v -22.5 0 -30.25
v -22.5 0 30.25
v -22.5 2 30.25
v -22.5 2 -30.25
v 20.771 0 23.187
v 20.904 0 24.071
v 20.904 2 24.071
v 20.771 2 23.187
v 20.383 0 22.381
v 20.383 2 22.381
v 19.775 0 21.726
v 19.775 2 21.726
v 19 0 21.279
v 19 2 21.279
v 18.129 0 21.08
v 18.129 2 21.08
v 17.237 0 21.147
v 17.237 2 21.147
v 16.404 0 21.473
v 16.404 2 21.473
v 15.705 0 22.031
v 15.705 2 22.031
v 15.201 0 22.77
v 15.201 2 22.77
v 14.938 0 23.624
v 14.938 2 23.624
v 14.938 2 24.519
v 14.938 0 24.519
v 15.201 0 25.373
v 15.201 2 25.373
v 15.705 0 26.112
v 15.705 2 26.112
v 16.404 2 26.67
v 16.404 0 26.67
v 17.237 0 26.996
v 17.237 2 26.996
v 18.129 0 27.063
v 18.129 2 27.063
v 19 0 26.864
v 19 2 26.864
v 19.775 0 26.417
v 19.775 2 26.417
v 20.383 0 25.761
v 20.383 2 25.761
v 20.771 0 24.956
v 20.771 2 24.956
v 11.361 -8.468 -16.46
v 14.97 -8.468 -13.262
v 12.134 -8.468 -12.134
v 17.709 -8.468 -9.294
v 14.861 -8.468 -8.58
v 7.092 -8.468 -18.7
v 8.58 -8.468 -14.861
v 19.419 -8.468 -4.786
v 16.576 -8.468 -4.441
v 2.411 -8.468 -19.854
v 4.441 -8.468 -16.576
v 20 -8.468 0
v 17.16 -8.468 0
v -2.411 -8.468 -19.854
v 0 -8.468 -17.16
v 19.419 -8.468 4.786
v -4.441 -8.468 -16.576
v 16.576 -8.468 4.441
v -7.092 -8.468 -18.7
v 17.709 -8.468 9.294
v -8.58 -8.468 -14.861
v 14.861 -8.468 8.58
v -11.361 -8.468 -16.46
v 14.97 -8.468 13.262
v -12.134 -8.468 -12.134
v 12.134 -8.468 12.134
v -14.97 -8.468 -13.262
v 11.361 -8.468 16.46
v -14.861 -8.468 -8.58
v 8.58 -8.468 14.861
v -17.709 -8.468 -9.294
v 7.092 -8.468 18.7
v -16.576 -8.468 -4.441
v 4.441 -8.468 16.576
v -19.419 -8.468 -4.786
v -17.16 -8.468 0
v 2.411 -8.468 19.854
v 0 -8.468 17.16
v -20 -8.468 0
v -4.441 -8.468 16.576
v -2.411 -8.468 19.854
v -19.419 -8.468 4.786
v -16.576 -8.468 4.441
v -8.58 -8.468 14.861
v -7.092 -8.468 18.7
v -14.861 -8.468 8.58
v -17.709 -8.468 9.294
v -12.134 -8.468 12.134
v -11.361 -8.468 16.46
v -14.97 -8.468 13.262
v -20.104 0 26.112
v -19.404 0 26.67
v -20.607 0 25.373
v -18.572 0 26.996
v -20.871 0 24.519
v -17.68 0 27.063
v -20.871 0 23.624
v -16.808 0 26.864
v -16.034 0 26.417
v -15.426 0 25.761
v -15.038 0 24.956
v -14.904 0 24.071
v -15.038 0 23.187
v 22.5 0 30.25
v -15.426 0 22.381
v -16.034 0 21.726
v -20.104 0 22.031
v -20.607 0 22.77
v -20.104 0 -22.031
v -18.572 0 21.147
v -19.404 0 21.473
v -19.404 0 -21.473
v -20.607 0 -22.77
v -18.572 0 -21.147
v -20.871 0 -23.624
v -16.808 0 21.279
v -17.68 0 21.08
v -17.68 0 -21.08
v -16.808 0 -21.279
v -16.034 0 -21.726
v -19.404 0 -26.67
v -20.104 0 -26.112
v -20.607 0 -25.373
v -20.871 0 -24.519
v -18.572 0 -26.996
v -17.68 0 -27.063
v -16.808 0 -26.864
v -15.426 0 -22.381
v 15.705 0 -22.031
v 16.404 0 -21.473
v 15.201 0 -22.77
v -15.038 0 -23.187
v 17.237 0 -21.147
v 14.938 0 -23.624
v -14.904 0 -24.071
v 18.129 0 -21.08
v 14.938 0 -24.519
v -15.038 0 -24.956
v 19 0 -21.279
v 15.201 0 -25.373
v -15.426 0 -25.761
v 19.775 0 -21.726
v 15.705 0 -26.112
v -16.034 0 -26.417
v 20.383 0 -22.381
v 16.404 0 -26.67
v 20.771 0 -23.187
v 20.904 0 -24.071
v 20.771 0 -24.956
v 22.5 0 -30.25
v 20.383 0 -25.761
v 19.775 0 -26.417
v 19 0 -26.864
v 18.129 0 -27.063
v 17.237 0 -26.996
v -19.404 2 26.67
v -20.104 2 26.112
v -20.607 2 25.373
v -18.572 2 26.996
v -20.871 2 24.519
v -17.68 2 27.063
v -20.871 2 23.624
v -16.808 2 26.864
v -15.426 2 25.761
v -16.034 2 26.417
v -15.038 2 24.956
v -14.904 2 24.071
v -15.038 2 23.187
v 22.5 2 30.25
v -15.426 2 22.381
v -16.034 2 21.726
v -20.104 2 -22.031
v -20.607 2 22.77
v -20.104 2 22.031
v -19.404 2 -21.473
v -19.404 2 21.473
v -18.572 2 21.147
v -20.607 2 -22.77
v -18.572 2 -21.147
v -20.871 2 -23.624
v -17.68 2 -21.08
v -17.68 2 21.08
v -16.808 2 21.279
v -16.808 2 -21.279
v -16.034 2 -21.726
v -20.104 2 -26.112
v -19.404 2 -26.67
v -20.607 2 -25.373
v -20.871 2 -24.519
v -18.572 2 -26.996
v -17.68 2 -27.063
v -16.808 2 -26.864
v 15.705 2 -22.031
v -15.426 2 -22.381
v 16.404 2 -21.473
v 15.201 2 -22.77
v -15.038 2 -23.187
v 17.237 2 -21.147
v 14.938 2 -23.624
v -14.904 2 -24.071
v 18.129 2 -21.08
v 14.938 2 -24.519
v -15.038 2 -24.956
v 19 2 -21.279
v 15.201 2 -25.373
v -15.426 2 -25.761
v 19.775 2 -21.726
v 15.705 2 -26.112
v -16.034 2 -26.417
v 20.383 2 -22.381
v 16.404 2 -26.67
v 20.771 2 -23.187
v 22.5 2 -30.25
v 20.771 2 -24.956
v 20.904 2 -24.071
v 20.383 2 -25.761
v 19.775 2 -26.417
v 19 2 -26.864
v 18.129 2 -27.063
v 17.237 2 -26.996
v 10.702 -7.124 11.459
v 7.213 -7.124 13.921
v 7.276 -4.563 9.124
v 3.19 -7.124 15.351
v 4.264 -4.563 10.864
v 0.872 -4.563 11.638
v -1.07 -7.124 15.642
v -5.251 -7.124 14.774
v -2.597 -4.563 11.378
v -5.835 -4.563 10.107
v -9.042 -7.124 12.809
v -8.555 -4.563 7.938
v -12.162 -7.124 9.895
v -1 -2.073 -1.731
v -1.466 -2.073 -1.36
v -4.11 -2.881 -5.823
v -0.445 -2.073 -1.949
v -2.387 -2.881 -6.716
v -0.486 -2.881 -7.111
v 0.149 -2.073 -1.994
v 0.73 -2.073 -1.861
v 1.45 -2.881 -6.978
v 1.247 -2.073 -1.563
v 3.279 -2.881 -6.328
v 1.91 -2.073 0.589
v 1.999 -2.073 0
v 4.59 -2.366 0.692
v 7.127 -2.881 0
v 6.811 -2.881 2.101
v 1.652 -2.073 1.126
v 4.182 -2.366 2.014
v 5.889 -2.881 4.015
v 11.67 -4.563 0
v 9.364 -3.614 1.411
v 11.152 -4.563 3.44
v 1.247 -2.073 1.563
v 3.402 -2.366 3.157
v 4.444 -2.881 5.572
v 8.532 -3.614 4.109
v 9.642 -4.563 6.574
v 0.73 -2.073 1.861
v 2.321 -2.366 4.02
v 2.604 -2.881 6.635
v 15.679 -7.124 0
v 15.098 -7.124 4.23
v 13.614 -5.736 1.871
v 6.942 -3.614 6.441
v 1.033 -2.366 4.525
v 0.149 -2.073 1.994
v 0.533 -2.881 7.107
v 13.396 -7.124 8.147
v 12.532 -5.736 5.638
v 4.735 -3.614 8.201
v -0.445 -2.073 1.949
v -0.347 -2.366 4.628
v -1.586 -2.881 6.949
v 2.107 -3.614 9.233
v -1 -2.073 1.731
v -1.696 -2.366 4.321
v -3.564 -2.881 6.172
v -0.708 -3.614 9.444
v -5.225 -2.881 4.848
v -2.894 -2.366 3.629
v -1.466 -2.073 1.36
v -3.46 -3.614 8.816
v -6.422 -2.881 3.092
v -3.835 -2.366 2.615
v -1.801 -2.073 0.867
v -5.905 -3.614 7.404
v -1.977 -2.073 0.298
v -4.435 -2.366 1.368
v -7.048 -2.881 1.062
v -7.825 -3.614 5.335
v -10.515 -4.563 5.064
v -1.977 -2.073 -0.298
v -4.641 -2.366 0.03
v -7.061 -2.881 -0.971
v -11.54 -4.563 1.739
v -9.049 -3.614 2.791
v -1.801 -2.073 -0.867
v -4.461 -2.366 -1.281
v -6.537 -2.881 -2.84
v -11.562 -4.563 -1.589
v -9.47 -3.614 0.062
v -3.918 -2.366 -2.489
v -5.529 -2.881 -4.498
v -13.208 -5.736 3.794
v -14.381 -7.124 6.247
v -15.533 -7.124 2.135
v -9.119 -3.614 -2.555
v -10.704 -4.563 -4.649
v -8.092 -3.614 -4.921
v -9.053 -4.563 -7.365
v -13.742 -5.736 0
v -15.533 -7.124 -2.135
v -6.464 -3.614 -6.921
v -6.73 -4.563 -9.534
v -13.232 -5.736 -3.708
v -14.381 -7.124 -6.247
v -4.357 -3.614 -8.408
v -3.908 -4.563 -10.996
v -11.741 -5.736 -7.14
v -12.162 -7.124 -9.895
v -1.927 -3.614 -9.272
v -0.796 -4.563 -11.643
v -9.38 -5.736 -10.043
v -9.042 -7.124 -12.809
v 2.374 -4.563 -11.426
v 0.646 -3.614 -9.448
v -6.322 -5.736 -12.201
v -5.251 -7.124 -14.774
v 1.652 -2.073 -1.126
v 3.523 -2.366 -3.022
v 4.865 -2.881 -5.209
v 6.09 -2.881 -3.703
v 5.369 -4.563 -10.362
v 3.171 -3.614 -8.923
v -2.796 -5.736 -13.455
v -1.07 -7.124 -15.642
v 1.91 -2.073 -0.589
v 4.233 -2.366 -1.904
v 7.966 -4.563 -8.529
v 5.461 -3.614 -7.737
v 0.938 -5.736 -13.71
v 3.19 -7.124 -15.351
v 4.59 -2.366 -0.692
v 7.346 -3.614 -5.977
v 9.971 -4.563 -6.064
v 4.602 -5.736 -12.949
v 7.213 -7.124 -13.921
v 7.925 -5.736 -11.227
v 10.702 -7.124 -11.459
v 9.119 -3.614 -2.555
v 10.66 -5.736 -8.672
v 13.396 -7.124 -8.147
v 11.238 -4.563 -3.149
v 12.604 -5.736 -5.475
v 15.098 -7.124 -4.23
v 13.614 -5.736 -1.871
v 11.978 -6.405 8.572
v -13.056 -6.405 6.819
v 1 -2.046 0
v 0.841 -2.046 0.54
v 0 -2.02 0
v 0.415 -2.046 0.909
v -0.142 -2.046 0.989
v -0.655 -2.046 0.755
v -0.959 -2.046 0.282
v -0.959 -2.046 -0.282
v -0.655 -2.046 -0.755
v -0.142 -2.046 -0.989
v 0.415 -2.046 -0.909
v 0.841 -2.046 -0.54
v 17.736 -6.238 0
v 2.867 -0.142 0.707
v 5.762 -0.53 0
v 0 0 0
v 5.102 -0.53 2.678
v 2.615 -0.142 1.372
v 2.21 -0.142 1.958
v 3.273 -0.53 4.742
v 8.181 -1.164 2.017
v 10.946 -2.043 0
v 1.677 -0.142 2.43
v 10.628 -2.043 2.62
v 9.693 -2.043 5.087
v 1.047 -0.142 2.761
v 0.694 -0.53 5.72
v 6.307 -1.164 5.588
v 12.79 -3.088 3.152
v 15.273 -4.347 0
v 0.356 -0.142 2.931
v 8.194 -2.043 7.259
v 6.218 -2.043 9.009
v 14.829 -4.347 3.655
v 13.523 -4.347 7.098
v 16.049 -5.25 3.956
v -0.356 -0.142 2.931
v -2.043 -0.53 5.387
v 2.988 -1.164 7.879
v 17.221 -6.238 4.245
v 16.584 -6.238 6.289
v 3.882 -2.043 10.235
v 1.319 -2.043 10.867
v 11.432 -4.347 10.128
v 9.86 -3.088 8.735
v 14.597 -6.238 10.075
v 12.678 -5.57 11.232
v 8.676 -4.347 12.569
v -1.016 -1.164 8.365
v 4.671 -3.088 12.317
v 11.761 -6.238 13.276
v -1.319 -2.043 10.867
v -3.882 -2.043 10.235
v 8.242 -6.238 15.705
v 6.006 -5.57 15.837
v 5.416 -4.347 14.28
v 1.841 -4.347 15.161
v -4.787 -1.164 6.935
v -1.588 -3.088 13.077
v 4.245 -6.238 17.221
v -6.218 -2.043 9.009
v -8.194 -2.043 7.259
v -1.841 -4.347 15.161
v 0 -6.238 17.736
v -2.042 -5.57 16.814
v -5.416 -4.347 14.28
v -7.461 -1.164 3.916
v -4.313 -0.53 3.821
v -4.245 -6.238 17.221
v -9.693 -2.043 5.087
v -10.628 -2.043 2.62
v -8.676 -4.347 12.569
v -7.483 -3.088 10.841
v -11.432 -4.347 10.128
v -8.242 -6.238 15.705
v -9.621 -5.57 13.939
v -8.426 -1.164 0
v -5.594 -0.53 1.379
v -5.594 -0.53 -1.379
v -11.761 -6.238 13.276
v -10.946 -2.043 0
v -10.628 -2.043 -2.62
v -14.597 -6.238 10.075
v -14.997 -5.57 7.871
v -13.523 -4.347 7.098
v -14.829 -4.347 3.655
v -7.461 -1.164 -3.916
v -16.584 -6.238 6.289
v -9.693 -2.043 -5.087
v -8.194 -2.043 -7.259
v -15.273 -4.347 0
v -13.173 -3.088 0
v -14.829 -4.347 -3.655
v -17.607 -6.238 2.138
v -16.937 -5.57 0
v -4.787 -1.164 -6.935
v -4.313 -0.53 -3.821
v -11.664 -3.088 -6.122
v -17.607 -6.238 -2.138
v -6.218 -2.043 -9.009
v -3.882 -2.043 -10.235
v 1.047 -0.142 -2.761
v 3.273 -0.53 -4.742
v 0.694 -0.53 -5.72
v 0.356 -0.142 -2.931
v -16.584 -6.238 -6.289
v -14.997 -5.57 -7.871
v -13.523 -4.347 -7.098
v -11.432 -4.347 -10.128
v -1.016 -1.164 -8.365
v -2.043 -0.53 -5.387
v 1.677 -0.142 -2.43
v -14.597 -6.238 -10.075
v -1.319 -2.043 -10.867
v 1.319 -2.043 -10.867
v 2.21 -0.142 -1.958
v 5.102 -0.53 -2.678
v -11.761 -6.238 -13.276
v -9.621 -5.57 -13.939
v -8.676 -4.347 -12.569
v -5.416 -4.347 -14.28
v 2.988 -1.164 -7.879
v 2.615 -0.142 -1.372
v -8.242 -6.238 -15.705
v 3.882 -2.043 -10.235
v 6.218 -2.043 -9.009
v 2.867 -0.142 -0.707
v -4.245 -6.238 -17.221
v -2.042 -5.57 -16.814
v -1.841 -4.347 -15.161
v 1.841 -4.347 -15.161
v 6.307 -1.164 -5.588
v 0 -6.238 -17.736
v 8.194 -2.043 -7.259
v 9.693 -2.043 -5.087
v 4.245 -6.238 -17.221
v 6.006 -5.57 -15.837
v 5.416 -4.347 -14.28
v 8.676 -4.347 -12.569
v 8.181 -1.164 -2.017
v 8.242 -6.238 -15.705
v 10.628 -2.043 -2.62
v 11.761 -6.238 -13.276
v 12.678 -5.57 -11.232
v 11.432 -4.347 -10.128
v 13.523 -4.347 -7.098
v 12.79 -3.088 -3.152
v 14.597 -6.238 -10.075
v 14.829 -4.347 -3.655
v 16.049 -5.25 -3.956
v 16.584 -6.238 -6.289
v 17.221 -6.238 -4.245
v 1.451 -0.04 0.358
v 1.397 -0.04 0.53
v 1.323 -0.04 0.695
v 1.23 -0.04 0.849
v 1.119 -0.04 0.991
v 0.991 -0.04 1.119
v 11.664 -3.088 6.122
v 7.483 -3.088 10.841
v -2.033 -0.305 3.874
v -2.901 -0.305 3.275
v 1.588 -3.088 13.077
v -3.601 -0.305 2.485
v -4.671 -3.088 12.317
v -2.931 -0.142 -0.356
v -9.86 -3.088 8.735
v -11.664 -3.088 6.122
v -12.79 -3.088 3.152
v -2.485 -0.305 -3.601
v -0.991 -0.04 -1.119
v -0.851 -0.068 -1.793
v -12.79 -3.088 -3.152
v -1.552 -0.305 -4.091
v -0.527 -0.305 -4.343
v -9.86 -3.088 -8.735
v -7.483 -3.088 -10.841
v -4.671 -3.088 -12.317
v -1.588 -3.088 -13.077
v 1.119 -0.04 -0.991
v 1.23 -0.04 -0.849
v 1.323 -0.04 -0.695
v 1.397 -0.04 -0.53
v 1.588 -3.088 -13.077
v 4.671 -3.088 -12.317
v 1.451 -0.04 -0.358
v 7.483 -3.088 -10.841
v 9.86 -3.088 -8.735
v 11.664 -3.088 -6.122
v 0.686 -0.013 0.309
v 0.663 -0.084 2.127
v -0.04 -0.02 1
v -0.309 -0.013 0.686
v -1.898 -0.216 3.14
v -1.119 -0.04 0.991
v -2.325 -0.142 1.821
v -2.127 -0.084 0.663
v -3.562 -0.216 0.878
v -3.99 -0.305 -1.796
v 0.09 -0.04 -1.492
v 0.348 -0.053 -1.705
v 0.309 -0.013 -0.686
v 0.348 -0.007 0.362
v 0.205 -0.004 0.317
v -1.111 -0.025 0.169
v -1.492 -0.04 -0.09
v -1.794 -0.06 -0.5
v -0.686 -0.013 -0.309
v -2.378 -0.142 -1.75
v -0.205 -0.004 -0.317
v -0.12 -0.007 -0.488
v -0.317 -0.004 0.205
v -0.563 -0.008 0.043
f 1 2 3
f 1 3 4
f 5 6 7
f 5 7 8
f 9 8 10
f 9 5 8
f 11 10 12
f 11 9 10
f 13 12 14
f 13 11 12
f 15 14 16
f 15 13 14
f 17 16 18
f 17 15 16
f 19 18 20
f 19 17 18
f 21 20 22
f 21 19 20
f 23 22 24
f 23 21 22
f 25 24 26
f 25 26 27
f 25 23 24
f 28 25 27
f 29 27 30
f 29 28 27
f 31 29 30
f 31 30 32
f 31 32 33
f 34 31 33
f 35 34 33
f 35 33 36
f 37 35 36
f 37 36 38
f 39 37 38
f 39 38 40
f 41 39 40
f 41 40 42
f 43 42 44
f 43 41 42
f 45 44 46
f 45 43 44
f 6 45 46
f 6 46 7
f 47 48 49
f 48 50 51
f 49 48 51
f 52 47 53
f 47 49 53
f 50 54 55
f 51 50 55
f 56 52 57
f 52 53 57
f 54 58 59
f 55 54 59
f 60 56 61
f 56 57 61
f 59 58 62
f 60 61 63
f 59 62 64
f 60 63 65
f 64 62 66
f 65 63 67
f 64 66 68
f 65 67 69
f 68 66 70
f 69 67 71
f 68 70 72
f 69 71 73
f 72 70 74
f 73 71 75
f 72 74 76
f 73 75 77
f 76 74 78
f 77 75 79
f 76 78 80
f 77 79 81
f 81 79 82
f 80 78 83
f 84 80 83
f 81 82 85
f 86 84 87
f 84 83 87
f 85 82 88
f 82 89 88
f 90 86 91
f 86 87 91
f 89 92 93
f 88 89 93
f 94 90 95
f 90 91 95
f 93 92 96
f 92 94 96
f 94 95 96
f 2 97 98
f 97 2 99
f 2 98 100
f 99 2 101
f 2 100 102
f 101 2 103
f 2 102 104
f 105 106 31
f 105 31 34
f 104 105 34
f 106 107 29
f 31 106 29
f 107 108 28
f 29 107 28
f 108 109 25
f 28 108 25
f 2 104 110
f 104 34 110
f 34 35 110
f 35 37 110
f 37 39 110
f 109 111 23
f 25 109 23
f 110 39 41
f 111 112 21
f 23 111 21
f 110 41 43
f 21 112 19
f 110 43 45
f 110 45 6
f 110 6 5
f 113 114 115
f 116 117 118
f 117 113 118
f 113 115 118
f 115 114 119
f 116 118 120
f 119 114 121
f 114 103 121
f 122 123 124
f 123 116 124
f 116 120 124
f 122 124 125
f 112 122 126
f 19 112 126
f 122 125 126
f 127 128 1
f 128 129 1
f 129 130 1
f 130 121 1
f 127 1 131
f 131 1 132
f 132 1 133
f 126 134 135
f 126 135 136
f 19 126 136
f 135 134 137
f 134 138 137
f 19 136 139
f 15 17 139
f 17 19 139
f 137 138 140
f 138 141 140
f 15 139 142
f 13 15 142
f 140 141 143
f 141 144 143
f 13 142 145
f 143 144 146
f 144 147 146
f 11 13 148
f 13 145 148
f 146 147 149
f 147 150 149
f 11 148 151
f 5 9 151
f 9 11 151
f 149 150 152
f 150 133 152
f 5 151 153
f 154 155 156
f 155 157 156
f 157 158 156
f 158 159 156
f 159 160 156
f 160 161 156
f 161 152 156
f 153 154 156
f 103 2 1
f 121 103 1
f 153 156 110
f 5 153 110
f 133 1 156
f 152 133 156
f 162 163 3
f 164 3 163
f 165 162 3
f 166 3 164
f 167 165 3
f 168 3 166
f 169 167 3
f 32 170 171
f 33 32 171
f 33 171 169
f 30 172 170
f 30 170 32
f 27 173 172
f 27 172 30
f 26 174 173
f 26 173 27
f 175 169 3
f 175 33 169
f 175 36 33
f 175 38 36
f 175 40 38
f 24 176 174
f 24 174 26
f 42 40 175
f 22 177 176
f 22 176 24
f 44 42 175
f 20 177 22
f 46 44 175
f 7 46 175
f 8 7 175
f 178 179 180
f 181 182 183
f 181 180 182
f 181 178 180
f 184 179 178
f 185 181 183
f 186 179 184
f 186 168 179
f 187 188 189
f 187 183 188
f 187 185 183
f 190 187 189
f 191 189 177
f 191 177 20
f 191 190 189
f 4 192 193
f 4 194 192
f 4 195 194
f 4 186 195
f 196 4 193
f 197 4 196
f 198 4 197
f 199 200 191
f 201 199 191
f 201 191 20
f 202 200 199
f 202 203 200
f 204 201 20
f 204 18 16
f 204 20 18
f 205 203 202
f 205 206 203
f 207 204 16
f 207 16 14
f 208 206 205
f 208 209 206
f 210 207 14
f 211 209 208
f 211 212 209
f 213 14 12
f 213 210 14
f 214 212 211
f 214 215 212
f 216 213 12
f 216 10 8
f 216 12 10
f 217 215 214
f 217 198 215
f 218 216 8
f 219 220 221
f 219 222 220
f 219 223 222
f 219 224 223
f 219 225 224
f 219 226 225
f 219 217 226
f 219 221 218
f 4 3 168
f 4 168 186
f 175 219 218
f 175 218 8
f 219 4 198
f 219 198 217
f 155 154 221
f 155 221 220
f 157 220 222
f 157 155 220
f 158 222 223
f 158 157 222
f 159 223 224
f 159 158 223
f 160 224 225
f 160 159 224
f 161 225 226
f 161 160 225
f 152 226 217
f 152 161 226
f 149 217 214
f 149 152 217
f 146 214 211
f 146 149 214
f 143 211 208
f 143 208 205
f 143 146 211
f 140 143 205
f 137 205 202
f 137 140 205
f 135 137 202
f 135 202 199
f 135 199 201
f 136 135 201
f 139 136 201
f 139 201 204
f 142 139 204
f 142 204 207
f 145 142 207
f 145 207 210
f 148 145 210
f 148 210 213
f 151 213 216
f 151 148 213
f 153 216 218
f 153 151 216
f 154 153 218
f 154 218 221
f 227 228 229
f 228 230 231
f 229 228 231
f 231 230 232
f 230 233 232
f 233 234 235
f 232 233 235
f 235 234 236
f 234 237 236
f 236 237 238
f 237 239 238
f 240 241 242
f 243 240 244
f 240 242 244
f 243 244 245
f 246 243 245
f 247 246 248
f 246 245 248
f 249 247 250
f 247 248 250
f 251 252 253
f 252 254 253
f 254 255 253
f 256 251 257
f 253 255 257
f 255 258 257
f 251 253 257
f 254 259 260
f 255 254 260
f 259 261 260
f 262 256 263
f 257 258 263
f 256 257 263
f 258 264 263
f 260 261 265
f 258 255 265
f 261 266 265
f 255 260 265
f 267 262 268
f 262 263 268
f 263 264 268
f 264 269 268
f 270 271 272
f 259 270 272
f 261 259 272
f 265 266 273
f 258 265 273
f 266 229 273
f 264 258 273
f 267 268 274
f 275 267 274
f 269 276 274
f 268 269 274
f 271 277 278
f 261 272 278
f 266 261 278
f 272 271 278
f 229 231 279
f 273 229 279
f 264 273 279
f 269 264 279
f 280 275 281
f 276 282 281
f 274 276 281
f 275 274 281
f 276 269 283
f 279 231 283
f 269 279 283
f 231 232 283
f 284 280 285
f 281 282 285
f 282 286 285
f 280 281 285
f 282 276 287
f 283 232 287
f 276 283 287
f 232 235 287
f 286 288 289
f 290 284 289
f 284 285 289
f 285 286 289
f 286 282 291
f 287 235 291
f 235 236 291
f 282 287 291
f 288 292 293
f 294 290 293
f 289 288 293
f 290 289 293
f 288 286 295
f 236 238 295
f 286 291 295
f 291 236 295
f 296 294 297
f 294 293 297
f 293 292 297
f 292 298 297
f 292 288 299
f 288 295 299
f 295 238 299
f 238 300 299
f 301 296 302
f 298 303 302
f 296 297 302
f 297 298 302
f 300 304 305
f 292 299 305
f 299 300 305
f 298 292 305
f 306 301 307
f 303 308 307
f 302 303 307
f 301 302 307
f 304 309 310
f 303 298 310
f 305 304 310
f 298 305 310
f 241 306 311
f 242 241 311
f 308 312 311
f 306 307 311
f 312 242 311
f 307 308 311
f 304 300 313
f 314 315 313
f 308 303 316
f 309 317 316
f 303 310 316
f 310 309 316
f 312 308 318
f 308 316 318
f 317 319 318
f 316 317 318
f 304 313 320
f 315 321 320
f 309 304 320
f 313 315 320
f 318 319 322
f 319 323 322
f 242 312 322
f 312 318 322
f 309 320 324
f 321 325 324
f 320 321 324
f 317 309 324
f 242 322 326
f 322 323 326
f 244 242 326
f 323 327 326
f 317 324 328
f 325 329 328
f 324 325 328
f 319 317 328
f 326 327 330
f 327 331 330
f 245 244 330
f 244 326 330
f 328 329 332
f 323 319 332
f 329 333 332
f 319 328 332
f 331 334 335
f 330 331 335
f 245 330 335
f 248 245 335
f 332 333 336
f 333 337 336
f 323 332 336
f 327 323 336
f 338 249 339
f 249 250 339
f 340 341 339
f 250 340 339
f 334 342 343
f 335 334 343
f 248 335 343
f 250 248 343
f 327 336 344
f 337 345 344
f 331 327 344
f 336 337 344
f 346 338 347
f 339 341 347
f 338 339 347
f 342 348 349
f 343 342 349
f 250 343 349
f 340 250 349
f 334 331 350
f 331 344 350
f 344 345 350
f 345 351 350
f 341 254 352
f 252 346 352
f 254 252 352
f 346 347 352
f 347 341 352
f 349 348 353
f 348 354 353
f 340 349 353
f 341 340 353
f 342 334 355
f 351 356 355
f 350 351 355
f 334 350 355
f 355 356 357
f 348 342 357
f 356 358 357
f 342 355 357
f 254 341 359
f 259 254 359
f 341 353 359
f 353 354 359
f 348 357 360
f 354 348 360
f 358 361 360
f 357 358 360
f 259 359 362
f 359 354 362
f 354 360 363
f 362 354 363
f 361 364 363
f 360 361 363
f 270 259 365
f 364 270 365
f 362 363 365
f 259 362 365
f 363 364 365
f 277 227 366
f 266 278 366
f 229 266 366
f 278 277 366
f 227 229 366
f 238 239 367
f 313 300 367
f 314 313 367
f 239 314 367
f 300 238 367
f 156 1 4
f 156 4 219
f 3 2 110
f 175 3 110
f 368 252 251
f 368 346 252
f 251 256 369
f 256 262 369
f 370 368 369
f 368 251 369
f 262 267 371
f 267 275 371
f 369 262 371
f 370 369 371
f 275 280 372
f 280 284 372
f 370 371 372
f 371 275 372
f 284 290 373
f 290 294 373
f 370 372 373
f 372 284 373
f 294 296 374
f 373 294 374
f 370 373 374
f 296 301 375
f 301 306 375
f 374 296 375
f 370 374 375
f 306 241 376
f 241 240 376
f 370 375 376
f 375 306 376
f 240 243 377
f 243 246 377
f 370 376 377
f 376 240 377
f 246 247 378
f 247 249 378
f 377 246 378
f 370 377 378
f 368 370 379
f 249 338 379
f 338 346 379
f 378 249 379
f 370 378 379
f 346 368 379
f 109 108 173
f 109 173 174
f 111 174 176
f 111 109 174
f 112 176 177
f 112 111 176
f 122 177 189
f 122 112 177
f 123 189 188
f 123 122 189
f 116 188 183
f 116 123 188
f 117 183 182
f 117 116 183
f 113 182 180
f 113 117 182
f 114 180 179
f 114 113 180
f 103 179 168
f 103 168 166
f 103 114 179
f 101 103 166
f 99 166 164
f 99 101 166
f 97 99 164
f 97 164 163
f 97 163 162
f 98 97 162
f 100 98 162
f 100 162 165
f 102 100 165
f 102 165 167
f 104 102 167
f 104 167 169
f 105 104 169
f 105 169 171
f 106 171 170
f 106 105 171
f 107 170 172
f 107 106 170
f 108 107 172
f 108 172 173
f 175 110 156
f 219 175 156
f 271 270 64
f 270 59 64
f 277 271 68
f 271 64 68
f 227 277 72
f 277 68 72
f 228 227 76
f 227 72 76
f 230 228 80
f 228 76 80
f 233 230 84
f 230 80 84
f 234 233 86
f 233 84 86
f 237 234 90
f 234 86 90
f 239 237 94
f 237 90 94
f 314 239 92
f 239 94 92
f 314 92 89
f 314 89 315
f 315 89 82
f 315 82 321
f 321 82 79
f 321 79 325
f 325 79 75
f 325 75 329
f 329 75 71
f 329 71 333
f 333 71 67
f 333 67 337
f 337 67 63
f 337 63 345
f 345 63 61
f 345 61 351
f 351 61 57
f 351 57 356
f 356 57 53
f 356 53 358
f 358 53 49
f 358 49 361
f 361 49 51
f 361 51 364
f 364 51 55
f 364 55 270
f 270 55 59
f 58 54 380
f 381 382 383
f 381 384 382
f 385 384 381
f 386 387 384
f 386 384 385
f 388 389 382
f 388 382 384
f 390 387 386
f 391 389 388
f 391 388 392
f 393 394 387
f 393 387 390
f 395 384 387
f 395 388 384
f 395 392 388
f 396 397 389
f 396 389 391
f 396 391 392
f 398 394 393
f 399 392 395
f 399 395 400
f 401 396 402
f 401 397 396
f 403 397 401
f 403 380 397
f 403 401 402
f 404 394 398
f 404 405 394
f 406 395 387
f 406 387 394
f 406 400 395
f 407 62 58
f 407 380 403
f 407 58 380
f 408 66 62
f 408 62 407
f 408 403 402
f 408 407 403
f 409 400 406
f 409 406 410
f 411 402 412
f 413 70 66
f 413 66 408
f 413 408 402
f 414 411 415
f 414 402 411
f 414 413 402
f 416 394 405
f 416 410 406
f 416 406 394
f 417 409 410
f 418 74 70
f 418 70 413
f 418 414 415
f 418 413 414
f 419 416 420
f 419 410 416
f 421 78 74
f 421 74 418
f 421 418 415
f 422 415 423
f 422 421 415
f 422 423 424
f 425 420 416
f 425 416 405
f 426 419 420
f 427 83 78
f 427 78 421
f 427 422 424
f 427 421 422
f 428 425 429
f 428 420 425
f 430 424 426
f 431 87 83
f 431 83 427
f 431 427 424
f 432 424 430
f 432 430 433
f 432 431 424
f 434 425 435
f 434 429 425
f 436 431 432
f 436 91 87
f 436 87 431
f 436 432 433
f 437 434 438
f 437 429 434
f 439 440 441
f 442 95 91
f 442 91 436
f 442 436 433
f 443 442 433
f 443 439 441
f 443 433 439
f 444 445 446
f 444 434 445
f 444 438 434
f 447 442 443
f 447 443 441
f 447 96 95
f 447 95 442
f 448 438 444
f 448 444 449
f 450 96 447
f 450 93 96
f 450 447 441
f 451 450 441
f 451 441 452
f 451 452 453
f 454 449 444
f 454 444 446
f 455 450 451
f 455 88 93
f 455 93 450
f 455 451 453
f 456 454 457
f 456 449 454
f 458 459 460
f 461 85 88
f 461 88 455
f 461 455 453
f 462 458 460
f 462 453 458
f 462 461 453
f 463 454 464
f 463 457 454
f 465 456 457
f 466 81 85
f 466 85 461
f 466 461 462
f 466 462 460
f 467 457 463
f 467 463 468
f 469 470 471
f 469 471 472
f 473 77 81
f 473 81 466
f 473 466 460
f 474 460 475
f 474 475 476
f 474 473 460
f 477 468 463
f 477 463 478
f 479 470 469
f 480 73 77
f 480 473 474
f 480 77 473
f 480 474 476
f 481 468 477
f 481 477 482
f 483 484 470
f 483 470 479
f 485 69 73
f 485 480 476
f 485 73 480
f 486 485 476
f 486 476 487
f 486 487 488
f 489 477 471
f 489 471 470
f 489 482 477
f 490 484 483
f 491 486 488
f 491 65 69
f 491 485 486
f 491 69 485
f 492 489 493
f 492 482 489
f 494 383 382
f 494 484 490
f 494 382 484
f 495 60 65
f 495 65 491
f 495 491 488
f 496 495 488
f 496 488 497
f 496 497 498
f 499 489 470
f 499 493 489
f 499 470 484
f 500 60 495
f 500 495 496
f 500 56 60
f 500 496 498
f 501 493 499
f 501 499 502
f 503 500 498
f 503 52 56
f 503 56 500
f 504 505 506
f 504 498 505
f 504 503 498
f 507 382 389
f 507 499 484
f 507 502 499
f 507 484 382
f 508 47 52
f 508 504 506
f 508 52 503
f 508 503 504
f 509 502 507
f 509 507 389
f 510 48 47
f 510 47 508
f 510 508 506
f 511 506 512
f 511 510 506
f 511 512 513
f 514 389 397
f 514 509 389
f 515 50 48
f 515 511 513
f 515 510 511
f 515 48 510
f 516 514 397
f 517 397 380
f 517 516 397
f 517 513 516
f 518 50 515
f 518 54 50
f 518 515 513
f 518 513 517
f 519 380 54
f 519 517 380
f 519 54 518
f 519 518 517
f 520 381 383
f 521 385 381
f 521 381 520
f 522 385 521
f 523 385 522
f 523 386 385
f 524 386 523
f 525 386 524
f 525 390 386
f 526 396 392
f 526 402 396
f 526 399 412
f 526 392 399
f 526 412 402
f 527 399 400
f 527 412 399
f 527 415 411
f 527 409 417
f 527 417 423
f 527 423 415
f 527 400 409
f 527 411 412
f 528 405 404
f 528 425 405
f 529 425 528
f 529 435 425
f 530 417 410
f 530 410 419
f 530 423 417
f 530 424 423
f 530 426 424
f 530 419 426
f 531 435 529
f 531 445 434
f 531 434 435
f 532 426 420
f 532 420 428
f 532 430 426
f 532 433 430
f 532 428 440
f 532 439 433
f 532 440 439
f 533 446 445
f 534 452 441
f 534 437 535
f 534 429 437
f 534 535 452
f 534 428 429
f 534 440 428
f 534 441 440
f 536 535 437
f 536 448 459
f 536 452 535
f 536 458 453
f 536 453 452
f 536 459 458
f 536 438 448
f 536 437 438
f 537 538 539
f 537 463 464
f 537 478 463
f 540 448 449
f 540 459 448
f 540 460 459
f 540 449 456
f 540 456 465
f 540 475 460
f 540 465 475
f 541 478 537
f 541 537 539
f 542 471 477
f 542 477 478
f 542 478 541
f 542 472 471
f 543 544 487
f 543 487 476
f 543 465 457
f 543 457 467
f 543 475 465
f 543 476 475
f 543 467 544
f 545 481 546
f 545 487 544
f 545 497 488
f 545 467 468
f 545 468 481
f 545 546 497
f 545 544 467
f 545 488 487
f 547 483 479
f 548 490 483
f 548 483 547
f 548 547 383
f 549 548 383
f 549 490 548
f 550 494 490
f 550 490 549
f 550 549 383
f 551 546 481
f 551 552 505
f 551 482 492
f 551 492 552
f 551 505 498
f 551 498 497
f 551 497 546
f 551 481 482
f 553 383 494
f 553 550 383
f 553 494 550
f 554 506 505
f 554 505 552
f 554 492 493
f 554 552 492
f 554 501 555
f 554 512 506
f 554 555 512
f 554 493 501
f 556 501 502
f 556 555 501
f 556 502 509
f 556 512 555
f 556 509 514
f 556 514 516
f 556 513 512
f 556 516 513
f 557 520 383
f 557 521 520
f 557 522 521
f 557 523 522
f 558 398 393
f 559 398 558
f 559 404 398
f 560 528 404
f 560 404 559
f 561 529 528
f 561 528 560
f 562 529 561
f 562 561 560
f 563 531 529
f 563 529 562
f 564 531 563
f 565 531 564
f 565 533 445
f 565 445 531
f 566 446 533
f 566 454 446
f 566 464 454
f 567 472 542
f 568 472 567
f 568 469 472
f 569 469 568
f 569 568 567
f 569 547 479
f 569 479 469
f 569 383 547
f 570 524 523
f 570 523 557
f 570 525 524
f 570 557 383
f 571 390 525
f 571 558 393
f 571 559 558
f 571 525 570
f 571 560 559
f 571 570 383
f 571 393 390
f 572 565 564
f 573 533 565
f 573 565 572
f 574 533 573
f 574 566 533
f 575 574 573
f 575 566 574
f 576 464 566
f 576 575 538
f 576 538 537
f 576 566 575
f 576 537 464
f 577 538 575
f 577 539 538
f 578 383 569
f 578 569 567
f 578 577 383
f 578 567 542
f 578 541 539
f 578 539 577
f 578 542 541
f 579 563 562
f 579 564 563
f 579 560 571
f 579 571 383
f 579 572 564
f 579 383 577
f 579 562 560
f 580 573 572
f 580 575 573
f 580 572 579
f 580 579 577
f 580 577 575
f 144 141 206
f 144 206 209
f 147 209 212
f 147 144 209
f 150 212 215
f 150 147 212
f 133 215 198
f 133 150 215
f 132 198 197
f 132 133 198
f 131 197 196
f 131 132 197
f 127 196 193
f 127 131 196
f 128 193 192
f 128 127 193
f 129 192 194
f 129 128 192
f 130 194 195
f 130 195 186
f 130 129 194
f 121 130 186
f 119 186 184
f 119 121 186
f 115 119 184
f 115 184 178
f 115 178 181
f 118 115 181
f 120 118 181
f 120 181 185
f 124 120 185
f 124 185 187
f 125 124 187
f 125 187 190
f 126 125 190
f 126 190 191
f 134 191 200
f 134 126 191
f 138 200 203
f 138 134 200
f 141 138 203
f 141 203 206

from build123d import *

# Parameters (mm, degrees)
SKETCH1_W           = 45
SKETCH1_H           = 60.5
SKETCH1_R           = 3
BOSS_EXTRUDE1_DEPTH = 2


with BuildPart() as part:
    # Sketch1 → Boss-Extrude1 (new body)
    with BuildSketch(Plane(origin=(0, 0, 0), x_dir=(1, 0, 0), z_dir=(0, 1, 0))):
        Rectangle(SKETCH1_W, SKETCH1_H)
        with Locations((17.904367565, 24.071427504)):
            Circle(SKETCH1_R, mode=Mode.SUBTRACT)
        with Locations((-17.904367565, 24.071427504)):
            Circle(SKETCH1_R, mode=Mode.SUBTRACT)
        with Locations((17.904367565, -24.071427504)):
            Circle(SKETCH1_R, mode=Mode.SUBTRACT)
        with Locations((-17.904367565, -24.071427504)):
            Circle(SKETCH1_R, mode=Mode.SUBTRACT)
    extrude(amount=BOSS_EXTRUDE1_DEPTH)


with BuildPart() as body_2:
    # Sketch2 → Revolve1 (revolve)
    with BuildSketch(Plane.XY):
        with BuildLine():
            Line((0, -2.019980921), (1.99930643, -2.072647775))
            add(Edge.make_bspline(
                [(1.99930643, -2.072647775), (2.666007666, -2.117291662), (4.014019168, -2.251616435), (6.549499982, -2.683388344), (9.525407915, -3.533799384), (12.765394617, -5.035648817), (14.749449818, -6.380365871), (15.679001727, -7.124399167)],
                knots=[0.08723148, 0.08723148, 0.08723148, 0.08723148, 0.177417467, 0.267603454, 0.447975427, 0.628347401, 0.808719374, 0.808719374, 0.808719374, 0.808719374], degree=3))
            Line((15.679001727, -7.124399167), (17.160402388, -8.468070288))
            Line((17.160402388, -8.468070288), (20, -8.468070288))
            add(Edge.make_bspline(
                [(0, 0), (12.43840622, -0.079628335), (20, -8.468070288)],
                knots=[0, 0, 0, 1, 1, 1], degree=2))
            Line((0, 0), (0, -2.019980921))
        make_face()
    revolve(axis=Axis((0, 10.005953766, 0), (0, -1, 0)))


solid = Compound([part.part, body_2.part])
